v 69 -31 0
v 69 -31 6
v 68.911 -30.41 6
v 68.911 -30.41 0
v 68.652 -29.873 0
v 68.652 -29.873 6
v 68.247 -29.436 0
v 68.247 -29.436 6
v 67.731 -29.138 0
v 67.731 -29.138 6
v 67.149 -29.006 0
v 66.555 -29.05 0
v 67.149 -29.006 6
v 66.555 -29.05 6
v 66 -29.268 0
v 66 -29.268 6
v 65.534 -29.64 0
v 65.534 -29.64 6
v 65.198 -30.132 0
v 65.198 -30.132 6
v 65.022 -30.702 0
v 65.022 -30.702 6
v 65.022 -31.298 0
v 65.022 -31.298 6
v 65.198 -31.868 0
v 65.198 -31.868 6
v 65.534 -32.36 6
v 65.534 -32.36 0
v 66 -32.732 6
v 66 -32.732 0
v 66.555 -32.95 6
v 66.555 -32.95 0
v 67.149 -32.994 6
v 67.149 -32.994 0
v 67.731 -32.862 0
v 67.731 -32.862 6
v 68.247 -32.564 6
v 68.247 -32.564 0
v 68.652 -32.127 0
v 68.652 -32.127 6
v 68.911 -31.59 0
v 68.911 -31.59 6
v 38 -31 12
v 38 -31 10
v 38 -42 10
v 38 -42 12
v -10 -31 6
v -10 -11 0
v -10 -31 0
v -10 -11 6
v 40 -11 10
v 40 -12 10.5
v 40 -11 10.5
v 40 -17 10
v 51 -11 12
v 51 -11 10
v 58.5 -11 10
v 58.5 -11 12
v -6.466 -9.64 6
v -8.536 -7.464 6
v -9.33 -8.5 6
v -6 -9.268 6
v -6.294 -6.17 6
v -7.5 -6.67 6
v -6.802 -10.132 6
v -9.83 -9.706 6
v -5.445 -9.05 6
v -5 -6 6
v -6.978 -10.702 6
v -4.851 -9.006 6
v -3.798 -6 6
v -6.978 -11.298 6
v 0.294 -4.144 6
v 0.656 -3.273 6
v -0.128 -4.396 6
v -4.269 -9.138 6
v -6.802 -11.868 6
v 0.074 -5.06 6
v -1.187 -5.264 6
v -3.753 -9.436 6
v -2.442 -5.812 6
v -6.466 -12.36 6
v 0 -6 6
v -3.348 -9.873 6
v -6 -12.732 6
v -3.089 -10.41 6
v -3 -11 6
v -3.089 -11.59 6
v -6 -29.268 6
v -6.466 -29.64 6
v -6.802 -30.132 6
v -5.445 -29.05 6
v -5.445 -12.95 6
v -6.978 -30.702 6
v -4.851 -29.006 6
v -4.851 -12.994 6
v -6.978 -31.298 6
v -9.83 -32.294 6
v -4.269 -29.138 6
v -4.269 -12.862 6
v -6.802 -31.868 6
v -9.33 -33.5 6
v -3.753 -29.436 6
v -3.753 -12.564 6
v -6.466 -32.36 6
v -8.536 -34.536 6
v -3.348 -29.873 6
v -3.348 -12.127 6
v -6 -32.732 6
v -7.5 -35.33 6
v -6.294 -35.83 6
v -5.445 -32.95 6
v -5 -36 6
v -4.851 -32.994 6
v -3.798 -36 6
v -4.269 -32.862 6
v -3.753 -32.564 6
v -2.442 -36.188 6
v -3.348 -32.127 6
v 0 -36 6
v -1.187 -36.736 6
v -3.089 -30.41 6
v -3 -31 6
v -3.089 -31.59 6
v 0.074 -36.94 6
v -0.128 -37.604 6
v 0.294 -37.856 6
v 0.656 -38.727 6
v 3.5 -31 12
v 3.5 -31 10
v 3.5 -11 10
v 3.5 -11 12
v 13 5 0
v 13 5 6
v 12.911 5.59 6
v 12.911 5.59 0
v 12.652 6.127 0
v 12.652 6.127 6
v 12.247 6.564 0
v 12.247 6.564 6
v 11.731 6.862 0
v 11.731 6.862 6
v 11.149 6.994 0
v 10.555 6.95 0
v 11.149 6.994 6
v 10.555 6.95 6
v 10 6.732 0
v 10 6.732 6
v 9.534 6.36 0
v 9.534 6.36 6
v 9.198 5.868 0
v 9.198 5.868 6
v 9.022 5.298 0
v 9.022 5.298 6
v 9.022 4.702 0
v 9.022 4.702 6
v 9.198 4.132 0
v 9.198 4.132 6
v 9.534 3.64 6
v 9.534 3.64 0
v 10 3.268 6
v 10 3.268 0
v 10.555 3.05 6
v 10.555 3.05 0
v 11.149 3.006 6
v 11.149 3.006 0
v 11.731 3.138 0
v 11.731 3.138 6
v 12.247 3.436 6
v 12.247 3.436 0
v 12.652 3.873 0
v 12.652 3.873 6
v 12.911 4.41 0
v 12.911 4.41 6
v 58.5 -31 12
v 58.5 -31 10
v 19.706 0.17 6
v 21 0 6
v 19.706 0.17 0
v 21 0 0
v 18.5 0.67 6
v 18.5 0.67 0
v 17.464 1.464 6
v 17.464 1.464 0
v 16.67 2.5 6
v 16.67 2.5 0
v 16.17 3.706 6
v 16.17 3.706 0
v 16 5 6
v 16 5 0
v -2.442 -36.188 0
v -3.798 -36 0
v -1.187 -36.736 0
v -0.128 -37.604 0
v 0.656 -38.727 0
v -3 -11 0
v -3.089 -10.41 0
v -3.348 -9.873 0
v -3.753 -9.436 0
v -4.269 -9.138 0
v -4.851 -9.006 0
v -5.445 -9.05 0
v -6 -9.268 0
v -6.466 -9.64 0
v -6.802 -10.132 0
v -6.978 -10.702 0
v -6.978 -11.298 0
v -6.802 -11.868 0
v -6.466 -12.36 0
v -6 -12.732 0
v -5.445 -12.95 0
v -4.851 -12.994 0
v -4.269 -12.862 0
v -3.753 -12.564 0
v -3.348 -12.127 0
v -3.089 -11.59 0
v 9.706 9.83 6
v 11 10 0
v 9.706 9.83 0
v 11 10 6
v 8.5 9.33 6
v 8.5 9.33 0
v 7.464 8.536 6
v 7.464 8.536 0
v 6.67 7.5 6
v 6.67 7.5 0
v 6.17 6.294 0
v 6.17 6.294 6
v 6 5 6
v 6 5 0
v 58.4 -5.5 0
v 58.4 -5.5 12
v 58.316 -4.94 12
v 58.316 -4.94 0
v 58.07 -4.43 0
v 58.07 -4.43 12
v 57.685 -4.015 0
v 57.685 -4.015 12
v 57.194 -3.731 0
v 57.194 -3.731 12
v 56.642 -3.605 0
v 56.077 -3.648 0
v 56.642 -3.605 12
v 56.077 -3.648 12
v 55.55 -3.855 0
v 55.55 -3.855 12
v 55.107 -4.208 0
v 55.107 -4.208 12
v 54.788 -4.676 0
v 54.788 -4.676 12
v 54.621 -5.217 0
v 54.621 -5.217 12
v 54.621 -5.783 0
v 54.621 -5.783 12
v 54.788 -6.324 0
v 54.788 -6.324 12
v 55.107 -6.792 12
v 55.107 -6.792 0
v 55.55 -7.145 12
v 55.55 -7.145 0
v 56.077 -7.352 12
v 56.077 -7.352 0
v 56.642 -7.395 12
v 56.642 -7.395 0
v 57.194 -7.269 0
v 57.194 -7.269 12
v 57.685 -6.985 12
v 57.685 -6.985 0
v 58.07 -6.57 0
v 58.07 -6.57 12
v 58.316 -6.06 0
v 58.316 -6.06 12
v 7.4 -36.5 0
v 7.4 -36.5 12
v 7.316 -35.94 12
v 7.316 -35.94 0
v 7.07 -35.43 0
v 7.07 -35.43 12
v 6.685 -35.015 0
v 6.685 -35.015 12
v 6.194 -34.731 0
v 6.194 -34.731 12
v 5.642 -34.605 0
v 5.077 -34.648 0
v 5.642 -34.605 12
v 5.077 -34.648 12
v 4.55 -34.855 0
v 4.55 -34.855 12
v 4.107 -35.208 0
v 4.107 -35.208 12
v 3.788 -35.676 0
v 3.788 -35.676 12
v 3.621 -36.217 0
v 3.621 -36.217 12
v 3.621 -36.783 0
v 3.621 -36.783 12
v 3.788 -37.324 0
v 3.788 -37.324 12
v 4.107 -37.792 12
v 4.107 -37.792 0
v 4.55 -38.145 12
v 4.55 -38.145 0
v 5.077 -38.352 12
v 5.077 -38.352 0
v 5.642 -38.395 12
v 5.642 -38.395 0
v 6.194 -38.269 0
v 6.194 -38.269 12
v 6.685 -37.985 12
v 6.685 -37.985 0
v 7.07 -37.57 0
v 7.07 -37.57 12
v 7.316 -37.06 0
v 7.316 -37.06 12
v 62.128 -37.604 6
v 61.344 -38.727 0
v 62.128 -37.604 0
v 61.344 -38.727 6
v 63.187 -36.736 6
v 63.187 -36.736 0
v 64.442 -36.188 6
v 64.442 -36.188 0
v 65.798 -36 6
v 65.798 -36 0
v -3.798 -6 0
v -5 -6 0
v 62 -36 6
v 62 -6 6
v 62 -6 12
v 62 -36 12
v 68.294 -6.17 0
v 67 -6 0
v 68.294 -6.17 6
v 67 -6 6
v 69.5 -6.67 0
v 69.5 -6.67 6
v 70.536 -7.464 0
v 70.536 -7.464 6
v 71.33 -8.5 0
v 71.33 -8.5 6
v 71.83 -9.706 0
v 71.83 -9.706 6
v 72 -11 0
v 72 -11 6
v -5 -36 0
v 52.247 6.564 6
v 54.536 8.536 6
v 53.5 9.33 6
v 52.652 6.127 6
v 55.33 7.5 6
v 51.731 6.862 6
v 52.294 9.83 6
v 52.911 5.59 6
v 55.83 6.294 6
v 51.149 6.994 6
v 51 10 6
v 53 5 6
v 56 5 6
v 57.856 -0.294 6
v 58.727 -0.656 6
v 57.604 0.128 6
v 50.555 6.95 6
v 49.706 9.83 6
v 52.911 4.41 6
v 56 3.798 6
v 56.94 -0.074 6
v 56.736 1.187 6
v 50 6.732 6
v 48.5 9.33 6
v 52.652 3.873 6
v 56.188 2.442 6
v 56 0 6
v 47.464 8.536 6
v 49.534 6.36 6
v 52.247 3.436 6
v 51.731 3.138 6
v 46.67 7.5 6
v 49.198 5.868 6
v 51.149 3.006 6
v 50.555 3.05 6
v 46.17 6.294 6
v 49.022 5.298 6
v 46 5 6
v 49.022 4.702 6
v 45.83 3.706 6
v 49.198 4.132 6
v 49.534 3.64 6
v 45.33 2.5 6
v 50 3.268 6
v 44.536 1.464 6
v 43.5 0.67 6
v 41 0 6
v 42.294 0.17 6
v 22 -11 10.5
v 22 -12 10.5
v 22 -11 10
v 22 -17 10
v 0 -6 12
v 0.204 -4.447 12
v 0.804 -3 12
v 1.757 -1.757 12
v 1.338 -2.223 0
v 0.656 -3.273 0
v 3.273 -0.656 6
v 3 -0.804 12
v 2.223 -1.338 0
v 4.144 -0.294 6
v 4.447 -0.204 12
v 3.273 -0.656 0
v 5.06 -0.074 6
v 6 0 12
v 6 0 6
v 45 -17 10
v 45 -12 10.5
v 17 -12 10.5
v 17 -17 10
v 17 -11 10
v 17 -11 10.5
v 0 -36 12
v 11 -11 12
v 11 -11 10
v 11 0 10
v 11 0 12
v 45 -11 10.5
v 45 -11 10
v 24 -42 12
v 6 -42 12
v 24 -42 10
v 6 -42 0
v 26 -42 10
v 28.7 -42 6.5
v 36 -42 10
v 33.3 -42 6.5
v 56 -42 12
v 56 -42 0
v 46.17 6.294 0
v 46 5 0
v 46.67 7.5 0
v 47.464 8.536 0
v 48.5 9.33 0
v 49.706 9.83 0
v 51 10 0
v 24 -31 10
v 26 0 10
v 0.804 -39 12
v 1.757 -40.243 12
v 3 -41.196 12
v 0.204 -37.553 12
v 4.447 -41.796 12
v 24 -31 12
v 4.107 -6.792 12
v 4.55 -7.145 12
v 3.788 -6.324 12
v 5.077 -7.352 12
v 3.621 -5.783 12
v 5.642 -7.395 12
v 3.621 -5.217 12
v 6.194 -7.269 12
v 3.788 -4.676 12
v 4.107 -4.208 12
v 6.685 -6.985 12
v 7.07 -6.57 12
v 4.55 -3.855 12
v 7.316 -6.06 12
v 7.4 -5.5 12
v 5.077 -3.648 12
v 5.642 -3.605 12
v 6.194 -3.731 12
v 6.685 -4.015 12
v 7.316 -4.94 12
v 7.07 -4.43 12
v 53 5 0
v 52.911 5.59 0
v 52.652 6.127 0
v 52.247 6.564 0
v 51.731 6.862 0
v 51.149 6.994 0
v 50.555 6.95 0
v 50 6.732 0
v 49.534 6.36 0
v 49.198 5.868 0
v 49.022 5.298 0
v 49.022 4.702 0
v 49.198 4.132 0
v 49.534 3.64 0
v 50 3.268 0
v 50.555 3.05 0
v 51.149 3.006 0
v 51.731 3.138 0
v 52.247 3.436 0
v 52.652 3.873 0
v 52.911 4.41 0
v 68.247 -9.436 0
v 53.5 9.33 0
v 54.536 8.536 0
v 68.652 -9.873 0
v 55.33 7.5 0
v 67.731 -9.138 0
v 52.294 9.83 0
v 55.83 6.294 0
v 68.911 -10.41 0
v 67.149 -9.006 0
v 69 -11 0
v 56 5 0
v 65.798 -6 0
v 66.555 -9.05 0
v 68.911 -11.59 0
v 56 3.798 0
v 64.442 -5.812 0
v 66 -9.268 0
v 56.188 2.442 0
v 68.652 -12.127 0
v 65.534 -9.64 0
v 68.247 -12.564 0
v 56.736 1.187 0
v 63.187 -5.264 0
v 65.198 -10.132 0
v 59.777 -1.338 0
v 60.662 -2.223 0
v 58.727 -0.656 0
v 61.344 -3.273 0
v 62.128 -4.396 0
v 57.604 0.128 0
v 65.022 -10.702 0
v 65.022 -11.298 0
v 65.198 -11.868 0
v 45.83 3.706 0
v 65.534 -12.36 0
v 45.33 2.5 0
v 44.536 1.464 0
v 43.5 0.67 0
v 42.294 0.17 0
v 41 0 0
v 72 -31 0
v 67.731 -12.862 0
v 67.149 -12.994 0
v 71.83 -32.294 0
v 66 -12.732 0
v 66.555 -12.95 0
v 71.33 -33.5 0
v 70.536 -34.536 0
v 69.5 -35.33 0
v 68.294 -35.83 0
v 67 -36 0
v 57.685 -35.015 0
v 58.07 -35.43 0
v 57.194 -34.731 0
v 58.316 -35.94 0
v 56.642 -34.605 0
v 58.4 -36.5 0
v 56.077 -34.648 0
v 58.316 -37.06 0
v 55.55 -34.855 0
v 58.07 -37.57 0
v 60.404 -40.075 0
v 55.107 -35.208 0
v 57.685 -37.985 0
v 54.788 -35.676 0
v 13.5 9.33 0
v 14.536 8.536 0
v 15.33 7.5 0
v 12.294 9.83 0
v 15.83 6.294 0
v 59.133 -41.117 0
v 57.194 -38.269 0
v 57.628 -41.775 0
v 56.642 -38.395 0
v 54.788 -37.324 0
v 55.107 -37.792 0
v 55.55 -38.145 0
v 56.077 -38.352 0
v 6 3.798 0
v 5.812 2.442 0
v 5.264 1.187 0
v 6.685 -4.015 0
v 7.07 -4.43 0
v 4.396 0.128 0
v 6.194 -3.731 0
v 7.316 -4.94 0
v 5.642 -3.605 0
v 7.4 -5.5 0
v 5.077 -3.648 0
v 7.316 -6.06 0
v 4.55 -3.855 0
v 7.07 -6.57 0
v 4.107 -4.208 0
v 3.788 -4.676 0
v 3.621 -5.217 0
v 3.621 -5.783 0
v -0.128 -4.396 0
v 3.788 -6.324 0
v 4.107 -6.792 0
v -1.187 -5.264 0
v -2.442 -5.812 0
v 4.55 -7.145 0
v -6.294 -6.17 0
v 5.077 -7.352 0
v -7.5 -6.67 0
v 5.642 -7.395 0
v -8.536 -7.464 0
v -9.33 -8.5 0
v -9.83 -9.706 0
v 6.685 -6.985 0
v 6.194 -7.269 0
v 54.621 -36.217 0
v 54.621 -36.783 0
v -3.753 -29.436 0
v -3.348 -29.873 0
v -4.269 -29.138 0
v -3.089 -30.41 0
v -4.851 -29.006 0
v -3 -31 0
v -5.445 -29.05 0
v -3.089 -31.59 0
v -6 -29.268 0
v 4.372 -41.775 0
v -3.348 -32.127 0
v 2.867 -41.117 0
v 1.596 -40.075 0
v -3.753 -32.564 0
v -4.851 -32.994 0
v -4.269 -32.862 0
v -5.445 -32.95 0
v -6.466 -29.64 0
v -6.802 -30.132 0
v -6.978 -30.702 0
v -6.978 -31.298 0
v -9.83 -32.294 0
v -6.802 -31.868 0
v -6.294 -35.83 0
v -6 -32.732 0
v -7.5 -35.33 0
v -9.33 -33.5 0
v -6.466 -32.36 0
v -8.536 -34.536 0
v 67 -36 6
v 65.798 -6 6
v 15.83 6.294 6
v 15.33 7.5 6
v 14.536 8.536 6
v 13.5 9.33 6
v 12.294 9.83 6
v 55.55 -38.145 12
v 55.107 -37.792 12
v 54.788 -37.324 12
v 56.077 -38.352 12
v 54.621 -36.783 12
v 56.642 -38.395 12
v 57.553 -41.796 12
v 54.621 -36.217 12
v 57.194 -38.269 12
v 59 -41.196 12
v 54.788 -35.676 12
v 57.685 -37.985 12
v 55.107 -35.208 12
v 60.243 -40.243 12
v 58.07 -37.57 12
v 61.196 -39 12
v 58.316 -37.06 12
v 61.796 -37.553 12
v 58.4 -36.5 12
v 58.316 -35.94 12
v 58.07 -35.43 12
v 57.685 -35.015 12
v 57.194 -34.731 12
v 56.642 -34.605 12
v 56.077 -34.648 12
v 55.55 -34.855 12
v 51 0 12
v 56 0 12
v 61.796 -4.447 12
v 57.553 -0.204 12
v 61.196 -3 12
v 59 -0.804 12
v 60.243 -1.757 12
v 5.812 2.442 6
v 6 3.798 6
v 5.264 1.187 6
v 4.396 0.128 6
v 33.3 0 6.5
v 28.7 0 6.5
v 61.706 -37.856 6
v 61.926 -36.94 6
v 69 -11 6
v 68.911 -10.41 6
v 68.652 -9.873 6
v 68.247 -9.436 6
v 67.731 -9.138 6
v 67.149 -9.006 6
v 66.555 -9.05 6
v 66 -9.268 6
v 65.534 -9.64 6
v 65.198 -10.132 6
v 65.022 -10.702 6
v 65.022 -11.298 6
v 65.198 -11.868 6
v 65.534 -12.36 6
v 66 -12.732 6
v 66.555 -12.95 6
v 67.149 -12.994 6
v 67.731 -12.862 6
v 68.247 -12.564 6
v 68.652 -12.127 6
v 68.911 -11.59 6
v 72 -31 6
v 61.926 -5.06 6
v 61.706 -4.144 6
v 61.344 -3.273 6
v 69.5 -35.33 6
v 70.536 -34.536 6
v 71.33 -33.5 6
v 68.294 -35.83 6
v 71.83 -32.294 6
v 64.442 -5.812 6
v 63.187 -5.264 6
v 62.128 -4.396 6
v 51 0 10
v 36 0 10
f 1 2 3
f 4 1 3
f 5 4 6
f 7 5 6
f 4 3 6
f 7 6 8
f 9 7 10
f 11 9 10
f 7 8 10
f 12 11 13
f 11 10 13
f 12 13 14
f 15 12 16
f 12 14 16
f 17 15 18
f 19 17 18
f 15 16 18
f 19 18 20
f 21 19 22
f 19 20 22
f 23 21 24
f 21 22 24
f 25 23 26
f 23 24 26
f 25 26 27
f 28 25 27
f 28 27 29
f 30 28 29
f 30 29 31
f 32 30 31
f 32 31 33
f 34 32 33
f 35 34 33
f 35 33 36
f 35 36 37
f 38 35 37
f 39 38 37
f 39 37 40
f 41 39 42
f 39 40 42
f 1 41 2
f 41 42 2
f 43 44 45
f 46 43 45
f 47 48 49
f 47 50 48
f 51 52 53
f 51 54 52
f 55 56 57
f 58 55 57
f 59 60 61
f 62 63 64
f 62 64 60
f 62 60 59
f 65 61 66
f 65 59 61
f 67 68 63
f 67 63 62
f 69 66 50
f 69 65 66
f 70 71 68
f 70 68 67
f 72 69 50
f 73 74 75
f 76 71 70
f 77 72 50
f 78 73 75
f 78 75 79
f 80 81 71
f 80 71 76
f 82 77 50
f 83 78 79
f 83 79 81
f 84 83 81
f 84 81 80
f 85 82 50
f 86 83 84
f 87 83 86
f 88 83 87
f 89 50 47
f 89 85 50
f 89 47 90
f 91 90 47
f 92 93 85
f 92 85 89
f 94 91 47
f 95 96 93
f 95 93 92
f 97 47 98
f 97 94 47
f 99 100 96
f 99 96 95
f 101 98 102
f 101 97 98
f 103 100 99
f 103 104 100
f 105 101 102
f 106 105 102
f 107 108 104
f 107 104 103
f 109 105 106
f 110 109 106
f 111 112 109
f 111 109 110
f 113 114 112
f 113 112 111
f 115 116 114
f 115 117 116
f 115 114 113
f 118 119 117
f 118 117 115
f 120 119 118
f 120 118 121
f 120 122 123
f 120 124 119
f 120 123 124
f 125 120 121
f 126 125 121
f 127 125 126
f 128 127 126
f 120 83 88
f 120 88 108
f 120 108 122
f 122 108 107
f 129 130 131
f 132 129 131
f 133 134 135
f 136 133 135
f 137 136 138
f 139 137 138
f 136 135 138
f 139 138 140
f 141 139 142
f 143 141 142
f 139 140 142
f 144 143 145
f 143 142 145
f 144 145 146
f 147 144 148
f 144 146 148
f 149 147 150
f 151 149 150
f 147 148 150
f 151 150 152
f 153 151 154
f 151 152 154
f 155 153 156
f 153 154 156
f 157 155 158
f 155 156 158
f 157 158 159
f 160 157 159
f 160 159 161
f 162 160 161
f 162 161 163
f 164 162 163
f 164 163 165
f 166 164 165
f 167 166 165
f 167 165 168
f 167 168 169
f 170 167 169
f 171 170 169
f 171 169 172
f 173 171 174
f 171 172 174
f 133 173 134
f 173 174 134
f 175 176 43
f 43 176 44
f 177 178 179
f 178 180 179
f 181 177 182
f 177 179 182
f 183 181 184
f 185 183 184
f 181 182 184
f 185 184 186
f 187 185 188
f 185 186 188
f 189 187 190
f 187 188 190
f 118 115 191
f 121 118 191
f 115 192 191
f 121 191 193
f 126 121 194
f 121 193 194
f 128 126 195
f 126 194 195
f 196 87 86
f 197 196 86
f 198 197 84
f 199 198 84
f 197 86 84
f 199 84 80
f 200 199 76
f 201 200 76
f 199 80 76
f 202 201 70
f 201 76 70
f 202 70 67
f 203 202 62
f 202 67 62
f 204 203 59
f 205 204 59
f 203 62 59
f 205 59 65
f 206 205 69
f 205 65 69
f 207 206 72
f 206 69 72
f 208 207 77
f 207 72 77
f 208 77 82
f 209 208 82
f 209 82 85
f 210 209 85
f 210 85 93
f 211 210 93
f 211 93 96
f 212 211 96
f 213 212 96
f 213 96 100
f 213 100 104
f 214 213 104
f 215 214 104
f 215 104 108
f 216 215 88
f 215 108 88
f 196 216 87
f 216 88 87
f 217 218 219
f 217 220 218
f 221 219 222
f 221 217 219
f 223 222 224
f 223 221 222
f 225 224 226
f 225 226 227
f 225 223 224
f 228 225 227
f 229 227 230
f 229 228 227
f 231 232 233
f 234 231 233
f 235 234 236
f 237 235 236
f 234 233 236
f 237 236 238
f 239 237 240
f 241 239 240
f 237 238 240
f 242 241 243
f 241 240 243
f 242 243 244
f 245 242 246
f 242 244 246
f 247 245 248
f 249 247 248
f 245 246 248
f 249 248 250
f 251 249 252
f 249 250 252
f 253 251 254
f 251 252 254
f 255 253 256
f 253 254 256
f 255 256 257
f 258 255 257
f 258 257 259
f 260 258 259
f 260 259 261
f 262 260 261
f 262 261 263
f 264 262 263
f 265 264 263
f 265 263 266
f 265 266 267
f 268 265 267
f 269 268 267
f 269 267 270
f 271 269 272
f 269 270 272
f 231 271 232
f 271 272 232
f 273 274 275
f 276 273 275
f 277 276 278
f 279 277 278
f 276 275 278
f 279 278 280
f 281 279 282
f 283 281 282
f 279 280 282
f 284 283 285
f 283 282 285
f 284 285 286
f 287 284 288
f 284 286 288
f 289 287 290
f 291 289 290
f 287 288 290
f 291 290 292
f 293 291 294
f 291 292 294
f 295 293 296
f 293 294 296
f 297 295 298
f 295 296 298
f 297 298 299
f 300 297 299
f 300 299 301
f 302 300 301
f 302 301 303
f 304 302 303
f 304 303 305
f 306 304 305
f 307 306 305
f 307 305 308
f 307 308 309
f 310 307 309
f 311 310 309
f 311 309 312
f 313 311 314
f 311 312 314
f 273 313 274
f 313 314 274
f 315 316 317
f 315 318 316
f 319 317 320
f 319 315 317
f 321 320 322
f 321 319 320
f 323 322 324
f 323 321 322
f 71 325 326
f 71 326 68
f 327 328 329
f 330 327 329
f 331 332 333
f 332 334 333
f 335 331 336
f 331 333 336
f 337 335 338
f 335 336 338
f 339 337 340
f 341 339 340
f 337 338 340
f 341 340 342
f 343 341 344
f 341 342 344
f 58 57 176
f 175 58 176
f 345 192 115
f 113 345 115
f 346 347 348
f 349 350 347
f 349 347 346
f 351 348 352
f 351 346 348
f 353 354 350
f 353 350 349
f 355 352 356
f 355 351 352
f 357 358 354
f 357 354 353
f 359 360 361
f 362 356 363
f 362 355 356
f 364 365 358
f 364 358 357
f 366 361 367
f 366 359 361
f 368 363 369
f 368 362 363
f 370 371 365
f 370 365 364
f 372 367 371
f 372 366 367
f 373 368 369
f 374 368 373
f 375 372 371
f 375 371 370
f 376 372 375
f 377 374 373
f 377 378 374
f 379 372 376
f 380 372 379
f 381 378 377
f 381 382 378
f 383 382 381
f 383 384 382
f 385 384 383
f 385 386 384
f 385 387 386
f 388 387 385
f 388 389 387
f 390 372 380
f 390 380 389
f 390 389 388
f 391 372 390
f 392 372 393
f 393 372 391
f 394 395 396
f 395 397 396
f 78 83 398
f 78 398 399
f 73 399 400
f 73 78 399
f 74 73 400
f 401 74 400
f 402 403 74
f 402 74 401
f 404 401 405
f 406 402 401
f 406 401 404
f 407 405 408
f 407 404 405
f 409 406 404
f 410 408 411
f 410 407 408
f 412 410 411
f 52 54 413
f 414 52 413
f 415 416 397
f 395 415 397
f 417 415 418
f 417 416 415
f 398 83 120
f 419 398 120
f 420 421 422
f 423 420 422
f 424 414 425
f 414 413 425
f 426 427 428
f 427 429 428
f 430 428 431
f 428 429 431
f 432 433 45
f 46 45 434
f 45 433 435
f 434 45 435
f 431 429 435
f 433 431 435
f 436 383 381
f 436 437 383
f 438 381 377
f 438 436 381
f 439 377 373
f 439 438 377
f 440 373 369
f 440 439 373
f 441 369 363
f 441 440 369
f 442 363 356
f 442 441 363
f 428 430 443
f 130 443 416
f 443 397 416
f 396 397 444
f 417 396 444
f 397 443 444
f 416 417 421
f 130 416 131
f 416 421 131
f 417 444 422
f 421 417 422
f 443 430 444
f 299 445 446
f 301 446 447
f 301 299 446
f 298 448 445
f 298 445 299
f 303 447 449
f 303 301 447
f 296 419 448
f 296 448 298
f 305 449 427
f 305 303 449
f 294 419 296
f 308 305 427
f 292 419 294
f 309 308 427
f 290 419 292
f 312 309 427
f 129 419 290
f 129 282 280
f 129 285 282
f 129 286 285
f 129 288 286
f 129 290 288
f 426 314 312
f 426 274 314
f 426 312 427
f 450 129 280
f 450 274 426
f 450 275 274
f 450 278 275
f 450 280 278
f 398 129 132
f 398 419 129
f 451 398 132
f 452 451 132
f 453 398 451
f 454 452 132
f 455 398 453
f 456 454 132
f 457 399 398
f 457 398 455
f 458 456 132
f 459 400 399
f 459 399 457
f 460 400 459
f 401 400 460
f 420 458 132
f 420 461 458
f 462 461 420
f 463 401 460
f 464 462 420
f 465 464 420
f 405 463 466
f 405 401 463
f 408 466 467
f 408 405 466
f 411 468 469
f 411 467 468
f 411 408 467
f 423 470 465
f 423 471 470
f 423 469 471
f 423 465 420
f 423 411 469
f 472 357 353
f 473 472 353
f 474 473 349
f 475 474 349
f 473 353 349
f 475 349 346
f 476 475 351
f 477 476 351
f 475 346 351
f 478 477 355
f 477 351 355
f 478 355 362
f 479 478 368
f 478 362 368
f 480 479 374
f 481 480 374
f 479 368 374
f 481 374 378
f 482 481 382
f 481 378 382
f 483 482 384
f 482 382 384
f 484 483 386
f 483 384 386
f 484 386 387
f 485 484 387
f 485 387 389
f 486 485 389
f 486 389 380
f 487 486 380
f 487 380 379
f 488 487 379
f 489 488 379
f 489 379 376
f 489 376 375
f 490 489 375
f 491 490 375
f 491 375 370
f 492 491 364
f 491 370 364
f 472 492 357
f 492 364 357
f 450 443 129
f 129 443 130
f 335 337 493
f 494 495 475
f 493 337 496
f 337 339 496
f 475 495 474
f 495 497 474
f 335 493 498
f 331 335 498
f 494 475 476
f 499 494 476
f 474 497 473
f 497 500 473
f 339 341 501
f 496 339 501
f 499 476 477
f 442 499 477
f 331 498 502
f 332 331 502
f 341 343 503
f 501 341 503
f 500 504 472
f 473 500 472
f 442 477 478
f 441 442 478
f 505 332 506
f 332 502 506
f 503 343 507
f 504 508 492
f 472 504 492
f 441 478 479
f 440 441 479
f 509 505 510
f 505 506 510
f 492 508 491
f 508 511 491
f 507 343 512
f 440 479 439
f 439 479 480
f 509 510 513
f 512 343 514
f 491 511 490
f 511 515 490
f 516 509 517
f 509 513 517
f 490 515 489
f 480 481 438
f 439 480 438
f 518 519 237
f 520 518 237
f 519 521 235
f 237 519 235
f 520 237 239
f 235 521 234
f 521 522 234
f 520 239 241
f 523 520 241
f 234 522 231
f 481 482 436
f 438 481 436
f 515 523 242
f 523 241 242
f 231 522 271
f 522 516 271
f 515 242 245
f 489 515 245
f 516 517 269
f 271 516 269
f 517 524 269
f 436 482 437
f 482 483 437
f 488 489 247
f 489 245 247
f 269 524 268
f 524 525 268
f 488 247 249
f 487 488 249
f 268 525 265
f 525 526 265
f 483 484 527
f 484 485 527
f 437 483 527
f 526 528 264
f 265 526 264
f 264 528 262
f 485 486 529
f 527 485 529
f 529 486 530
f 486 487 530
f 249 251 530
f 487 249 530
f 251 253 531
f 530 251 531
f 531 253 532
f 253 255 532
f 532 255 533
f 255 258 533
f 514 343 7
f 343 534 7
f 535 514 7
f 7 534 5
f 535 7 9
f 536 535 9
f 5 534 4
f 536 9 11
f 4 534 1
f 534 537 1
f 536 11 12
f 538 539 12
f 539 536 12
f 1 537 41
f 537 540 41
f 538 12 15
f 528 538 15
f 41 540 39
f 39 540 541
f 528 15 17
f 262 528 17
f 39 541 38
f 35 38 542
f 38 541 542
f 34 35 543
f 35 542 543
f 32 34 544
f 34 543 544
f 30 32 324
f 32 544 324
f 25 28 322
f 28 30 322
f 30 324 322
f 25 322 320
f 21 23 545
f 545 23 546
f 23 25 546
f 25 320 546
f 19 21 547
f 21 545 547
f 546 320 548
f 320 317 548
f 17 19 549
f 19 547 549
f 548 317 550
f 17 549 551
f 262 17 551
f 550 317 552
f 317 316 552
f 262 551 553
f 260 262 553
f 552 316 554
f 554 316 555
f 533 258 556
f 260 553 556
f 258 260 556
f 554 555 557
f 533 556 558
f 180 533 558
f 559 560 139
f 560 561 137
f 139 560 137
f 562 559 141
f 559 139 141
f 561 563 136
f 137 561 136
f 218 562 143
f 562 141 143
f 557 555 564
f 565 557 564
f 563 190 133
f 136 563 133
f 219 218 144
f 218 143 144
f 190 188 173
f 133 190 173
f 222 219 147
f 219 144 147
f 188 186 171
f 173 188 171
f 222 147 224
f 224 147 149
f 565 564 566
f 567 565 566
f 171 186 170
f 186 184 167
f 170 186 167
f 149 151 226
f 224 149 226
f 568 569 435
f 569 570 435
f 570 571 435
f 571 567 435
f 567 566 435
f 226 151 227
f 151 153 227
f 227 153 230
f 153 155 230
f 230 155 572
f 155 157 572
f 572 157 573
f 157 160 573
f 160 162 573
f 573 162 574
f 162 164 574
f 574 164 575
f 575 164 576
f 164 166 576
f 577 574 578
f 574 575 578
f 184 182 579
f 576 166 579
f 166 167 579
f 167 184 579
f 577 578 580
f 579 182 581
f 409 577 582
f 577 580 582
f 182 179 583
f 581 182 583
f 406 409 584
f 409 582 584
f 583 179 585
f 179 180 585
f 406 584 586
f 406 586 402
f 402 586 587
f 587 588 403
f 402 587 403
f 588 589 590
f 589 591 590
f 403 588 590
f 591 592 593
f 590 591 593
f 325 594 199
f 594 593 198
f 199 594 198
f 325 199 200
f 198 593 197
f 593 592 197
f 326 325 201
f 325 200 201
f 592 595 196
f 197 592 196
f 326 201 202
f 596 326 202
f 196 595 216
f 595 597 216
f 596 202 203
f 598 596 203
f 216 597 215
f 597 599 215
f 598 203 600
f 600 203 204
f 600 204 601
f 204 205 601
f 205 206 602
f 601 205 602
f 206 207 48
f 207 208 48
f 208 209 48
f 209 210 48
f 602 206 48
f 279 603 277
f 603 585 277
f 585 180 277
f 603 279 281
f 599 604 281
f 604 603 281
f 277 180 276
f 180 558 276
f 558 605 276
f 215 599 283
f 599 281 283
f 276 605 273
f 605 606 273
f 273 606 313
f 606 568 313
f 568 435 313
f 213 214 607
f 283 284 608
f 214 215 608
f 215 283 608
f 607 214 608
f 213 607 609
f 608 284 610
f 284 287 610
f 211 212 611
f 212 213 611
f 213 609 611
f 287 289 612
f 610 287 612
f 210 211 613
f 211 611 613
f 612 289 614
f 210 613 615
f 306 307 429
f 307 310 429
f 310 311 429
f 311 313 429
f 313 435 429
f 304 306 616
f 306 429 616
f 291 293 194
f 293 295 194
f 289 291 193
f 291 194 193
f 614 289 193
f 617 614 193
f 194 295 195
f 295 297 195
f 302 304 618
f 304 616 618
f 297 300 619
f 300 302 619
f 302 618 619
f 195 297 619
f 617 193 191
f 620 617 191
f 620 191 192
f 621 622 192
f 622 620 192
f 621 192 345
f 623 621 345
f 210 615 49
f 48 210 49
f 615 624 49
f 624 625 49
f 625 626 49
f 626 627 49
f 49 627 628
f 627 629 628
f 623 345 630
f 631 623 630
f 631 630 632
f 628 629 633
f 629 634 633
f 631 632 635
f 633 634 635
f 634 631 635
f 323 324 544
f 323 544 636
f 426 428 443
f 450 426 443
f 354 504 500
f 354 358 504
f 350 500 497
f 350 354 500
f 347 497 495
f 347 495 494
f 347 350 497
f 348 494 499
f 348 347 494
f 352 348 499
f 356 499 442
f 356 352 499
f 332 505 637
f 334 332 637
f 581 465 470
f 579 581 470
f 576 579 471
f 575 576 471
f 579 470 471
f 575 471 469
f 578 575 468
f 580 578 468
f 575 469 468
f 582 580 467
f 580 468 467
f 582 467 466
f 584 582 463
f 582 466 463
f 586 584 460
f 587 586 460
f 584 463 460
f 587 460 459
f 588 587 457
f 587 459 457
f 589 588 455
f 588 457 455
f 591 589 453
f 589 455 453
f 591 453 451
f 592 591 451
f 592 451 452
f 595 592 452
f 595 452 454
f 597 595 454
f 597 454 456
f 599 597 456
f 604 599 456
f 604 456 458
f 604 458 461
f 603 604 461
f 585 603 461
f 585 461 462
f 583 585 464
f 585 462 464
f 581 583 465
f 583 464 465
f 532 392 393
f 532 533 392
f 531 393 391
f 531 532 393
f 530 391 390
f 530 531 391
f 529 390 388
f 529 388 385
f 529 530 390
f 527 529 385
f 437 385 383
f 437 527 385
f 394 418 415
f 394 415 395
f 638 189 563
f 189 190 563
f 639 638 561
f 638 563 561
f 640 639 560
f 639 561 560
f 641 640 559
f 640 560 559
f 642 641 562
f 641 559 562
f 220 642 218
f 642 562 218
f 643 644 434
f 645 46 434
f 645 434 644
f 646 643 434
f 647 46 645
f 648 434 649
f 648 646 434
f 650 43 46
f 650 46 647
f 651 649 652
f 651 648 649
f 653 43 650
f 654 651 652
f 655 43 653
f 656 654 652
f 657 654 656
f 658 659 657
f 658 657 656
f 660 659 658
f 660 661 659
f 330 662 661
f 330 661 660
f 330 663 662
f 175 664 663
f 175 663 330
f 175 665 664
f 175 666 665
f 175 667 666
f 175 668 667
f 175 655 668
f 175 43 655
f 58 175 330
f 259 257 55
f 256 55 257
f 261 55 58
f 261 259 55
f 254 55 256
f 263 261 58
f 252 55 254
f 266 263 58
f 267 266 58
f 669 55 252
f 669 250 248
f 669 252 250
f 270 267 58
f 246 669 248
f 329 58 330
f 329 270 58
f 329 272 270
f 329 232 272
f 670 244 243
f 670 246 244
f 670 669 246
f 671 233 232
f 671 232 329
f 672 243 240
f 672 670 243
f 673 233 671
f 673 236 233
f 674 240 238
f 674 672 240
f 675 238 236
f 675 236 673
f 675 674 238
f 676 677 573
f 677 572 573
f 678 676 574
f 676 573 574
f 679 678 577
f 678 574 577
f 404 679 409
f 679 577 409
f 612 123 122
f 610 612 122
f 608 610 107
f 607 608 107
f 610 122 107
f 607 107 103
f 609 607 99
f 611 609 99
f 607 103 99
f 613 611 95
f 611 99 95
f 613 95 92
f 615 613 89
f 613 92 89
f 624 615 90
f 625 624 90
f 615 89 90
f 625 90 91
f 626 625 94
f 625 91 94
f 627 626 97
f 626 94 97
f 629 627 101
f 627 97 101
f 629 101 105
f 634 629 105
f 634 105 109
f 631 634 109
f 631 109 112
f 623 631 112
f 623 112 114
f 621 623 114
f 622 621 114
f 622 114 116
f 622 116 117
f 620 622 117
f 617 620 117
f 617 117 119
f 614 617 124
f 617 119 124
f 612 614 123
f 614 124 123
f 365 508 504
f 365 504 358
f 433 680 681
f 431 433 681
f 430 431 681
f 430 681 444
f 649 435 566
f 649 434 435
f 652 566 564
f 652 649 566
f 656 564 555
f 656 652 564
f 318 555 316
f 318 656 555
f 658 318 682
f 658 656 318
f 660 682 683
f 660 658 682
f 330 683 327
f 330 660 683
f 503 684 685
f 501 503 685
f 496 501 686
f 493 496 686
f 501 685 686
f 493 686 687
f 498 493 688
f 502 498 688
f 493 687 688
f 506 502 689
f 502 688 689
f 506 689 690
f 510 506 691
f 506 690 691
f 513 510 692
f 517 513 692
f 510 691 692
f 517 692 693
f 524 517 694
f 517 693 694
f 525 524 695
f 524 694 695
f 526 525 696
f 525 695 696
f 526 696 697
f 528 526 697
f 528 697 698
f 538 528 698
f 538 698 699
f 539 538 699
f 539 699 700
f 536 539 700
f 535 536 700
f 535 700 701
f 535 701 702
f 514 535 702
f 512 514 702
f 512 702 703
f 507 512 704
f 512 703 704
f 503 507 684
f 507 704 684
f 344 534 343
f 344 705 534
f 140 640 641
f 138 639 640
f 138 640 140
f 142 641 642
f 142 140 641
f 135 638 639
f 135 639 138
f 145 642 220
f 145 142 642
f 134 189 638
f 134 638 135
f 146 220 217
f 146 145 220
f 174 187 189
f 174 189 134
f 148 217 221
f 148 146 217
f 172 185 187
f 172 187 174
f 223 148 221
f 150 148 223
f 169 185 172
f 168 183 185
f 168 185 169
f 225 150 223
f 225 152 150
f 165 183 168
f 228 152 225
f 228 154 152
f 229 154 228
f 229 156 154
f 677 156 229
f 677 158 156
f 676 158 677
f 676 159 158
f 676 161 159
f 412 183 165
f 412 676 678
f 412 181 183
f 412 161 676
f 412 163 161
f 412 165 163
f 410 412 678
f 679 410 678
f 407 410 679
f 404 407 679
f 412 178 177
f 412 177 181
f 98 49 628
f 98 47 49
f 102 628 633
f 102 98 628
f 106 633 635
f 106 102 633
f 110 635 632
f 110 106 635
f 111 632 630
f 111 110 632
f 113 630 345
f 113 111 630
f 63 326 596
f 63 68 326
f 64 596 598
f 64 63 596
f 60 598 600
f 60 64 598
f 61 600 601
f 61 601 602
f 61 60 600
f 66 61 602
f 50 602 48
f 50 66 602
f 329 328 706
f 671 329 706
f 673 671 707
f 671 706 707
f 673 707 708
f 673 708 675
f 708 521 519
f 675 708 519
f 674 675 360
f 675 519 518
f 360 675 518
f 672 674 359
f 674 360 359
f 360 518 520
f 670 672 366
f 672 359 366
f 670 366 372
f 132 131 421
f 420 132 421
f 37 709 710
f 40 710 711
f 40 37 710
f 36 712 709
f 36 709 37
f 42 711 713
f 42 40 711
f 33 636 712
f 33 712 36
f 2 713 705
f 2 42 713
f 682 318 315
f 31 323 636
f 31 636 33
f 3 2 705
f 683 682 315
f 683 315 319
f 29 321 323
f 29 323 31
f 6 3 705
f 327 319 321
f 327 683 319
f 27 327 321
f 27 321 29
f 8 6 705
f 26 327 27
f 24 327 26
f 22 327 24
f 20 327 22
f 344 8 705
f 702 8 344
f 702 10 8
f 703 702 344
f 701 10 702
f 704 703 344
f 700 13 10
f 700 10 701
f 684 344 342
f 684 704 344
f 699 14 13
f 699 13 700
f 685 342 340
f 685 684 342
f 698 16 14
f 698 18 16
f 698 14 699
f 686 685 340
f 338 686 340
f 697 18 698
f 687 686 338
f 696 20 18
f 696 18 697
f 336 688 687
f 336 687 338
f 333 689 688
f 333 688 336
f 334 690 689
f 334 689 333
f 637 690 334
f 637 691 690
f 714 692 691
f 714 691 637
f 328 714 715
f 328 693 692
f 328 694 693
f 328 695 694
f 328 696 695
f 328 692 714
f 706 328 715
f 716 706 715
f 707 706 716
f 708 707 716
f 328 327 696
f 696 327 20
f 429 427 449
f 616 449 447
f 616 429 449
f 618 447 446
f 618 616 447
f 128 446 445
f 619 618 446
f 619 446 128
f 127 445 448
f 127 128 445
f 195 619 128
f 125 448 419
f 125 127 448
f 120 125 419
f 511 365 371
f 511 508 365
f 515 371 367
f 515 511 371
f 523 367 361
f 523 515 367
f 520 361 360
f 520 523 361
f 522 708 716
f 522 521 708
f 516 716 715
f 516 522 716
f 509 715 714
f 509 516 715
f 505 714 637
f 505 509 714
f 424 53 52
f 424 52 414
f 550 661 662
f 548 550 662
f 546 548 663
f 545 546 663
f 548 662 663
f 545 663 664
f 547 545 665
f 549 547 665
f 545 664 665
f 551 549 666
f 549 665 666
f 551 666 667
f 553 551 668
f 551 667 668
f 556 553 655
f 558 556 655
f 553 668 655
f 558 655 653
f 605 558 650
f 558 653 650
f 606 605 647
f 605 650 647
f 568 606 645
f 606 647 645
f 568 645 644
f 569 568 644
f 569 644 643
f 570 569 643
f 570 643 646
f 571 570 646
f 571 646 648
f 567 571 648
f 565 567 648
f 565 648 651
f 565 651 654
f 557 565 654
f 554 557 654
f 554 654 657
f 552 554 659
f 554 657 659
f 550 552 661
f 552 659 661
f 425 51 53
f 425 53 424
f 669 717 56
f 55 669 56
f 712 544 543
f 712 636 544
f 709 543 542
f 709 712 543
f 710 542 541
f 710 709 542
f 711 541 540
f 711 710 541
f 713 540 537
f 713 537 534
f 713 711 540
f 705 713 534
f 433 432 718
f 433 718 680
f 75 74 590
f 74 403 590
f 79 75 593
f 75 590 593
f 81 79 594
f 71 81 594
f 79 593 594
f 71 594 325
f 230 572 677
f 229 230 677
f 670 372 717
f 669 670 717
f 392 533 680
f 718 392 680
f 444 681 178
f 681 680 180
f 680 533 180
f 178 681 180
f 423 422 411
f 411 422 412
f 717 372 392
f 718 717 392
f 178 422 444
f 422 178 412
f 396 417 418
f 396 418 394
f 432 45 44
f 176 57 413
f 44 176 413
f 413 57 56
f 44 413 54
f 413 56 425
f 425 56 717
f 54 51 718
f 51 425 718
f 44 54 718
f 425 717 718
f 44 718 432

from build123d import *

# Parameters (mm, degrees)
F1_DEPTH    = 42
F4_DEPTH    = 2
F5_R        = 1.9
F6_DEPTH    = 12
F7_R        = 6
F8_W        = 30
F8_H        = 6
F9_DEPTH    = 10
F10_W       = 30
F10_H       = 6
F11_DEPTH   = 10
F12_W       = 50
F12_H       = 6
F13_DEPTH   = 10
F14_R       = 5
F15_R       = 2
F16_DEPTH   = 6
F17_W       = 5
F17_H       = 6
F18_DEPTH   = 0.5
F19_SIZE2   = 0.49999
F19_SIZE    = 4.99999
F19_2_SIZE2 = 0.49999
F19_2_SIZE  = 4.99999
F20_W       = 30
F20_H       = 10
F21_DEPTH   = 6
F22_R       = 4.99999


# Not quite as in the source:
# - a fillet or chamfer is up to 0.001 mm smaller than in the source, because OpenCascade refuses the exact size


with BuildPart() as f1:
    # F0 (on Front) → F1 (new body)
    with BuildSketch(Plane.XZ):
        Polygon((0, 10), (0, 0), (62, 0), (62, 10), (36, 10), (33.3, 6.5), (28.7, 6.5), (26, 10), align=None)
    extrude(amount=F1_DEPTH)

    # F3 (on face) → F4 (join)
    with BuildSketch(Plane.XY.offset(10)):
        Polygon((0, -42), (24, -42), (24, -31), (3.5, -31), (3.5, -11), (11, -11), (11, 0), (0, 0), align=None)
        Polygon((38, -42), (62, -42), (62, 0), (51, 0), (51, -11), (58.5, -11), (58.5, -31), (38, -31), align=None)
    extrude(amount=F4_DEPTH)

    # F5 (on face) → F6 (cut, through all)
    with BuildSketch(Plane.XY.offset(12)):
        with Locations((5.5, -5.5)):
            Circle(F5_R)
        with Locations((56.5, -5.5)):
            Circle(F5_R)
        with Locations((5.5, -36.5)):
            Circle(F5_R)
        with Locations((56.5, -36.5)):
            Circle(F5_R)
    extrude(amount=-F6_DEPTH, mode=Mode.SUBTRACT)

    # F7
    f7_edges = [f1.edges().sort_by_distance(p)[0] for p in [
        (0, -42, 6),
        (0, 0, 6),
        (62, -42, 6),
        (62, 0, 6),
    ]]
    fillet(f7_edges, radius=F7_R)

    # F8 (on face) → F9 (join)
    with BuildSketch(Plane.YZ.offset(62)):
        with Locations((-21, 3)):
            Rectangle(F8_W, F8_H)
    extrude(amount=F9_DEPTH)

    # F10 (on face) → F11 (join)
    with BuildSketch(Plane(origin=(0, 0, 0), x_dir=(0, -1, 0), z_dir=(-1, 0, 0))):
        with Locations((21, 3)):
            Rectangle(F10_W, F10_H)
    extrude(amount=F11_DEPTH)

    # F12 (on face) → F13 (join)
    with BuildSketch(Plane(origin=(0, 0, 0), x_dir=(-1, 0, 0), z_dir=(0, 1, 0))):
        with Locations((-31, 3)):
            Rectangle(F12_W, F12_H)
    extrude(amount=F13_DEPTH)

    # F14
    f14_edges = [f1.edges().sort_by_distance(p)[0] for p in [
        (6, 10, 3),
        (-10, -6, 3),
        (-10, -36, 3),
        (56, 10, 3),
        (72, -6, 3),
        (72, -36, 3),
        (6, 0, 9),
        (6, 0, 3),
        (0, -6, 9),
        (0, -6, 3),
        (0, -36, 9),
        (0, -36, 3),
        (56, 0, 9),
        (56, 0, 3),
        (62, -6, 9),
        (62, -6, 3),
        (62, -36, 3),
        (62, -36, 9),
    ]]
    fillet(f14_edges, radius=F14_R)

    # F15 (on face) → F16 (cut, through all)
    with BuildSketch(Plane.XY.offset(6)):
        with Locations((-5, -11)):
            Circle(F15_R)
        with Locations((-5, -31)):
            Circle(F15_R)
        with Locations((11, 5)):
            Circle(F15_R)
        with Locations((51, 5)):
            Circle(F15_R)
        with Locations((67, -11)):
            Circle(F15_R)
        with Locations((67, -31)):
            Circle(F15_R)
    extrude(amount=-F16_DEPTH, mode=Mode.SUBTRACT)

    # F17 (on face) → F18 (join)
    with BuildSketch(Plane.XY.offset(10)):
        with Locations((19.5, -14)):
            Rectangle(F17_W, F17_H)
        with Locations((42.5, -14)):
            Rectangle(F17_W, F17_H)
    extrude(amount=F18_DEPTH)

    # F19 (size 5 and 0.5 in the source; OpenCascade refuses exactly that, so slightly less here)
    f19_edges = [f1.edges().sort_by_distance(p)[0] for p in [
        (19.5, -17, 10.5),
    ]]
    f19_side = f1.faces().sort_by_distance((19.5, -14, 10.5))[0]
    chamfer(f19_edges, length=F19_SIZE, length2=F19_SIZE2, reference=f19_side)

    # F19#2 (size 5 and 0.5 in the source; OpenCascade refuses exactly that, so slightly less here)
    f19_2_edges = [f1.edges().sort_by_distance(p)[0] for p in [
        (42.5, -17, 10.5),
    ]]
    f19_2_side = f1.faces().sort_by_distance((42.5, -14, 10.5))[0]
    chamfer(f19_2_edges, length=F19_2_SIZE, length2=F19_2_SIZE2, reference=f19_2_side)

    # F20 (on face) → F21 (cut, through all)
    with BuildSketch(Plane.XY.offset(6)):
        with Locations((31, 5)):
            Rectangle(F20_W, F20_H)
    extrude(amount=-F21_DEPTH, mode=Mode.SUBTRACT)

    # F22 (radius 5 in the source; OpenCascade refuses exactly that, so slightly less here)
    f22_edges = [f1.edges().sort_by_distance(p)[0] for p in [
        (16, 10, 3),
        (46, 10, 3),
        (16, 0, 3),
        (46, 0, 3),
    ]]
    fillet(f22_edges, radius=F22_R)


solid = f1.part
